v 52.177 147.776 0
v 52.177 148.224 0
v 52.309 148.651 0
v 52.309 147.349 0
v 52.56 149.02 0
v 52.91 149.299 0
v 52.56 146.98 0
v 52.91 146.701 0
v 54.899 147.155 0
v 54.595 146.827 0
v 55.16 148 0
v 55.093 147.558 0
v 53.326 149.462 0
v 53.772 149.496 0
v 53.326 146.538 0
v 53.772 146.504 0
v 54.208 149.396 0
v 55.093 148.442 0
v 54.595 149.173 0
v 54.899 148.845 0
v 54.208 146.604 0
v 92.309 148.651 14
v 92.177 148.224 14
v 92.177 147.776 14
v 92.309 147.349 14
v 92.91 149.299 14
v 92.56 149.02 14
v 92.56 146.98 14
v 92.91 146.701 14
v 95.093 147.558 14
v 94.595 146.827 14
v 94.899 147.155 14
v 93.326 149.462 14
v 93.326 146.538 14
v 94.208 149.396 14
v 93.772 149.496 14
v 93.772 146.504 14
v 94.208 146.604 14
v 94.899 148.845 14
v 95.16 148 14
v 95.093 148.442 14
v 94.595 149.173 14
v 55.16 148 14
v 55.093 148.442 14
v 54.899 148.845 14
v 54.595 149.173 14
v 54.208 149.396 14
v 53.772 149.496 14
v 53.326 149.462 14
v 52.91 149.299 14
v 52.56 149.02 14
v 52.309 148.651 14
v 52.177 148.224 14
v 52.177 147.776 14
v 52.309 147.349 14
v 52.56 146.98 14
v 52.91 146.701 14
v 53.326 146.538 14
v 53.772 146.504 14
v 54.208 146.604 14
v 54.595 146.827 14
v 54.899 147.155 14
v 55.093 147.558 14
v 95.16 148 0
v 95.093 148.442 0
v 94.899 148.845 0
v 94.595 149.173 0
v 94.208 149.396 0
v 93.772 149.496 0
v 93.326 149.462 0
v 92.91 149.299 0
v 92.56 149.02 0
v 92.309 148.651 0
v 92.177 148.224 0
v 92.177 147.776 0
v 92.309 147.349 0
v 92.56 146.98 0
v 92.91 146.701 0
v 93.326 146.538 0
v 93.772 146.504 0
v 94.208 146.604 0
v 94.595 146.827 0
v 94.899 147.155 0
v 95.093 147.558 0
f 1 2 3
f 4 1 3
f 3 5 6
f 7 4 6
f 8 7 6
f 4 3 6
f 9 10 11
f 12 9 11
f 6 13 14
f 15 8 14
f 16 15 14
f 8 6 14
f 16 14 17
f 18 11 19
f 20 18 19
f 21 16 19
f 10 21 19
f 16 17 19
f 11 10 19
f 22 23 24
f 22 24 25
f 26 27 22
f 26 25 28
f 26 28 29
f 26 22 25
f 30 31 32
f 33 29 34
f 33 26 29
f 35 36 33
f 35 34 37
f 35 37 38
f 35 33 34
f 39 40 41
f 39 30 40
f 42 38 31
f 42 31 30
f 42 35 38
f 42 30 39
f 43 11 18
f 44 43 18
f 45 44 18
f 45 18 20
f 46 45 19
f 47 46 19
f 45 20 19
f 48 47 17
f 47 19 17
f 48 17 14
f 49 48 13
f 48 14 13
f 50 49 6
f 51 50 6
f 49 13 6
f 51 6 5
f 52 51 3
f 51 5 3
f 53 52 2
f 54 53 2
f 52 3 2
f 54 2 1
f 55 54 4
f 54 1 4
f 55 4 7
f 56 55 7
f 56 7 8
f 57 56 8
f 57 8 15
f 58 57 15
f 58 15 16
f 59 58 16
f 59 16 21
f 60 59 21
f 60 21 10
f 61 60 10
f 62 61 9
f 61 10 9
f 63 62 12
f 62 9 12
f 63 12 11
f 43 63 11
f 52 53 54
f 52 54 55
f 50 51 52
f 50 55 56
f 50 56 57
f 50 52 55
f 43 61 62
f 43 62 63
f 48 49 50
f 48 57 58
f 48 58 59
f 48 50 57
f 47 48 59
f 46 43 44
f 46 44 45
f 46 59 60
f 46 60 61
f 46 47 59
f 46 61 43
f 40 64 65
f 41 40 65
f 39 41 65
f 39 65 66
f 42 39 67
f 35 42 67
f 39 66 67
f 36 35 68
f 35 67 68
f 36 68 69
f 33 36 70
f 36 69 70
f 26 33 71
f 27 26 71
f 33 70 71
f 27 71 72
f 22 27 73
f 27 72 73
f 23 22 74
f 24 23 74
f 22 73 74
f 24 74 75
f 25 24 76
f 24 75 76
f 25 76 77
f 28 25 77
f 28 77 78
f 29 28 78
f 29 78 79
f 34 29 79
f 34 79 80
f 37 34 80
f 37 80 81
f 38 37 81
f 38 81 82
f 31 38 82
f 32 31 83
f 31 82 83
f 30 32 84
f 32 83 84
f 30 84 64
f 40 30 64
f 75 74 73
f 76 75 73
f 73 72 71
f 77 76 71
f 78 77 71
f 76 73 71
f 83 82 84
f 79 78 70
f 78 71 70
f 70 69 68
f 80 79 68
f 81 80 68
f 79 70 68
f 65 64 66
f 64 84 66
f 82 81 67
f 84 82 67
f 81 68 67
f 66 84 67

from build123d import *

# Parameters (mm, degrees)
CYLINDER091_R     = 1.5
CYLINDER091_DEPTH = 14
CYLINDER092_R     = 1.5
CYLINDER092_DEPTH = 14


with BuildPart() as ftthreaded2:
    # Cylinder091 → Cylinder091 (new body)
    with BuildSketch(Plane(origin=(53.66, 148, 0), x_dir=(1, 0, 0), z_dir=(0, 0, 1))):
        Circle(CYLINDER091_R)
    extrude(amount=CYLINDER091_DEPTH)


with BuildPart() as ftinsulatormount1:
    # Cylinder092 → Cylinder092 (new body)
    with BuildSketch(Plane(origin=(93.66, 148, 0), x_dir=(1, 0, 0), z_dir=(0, 0, 1))):
        Circle(CYLINDER092_R)
    extrude(amount=CYLINDER092_DEPTH)

    # Fusion040: union FTThreaded2
    add(ftthreaded2.part)


solid = ftinsulatormount1.part
